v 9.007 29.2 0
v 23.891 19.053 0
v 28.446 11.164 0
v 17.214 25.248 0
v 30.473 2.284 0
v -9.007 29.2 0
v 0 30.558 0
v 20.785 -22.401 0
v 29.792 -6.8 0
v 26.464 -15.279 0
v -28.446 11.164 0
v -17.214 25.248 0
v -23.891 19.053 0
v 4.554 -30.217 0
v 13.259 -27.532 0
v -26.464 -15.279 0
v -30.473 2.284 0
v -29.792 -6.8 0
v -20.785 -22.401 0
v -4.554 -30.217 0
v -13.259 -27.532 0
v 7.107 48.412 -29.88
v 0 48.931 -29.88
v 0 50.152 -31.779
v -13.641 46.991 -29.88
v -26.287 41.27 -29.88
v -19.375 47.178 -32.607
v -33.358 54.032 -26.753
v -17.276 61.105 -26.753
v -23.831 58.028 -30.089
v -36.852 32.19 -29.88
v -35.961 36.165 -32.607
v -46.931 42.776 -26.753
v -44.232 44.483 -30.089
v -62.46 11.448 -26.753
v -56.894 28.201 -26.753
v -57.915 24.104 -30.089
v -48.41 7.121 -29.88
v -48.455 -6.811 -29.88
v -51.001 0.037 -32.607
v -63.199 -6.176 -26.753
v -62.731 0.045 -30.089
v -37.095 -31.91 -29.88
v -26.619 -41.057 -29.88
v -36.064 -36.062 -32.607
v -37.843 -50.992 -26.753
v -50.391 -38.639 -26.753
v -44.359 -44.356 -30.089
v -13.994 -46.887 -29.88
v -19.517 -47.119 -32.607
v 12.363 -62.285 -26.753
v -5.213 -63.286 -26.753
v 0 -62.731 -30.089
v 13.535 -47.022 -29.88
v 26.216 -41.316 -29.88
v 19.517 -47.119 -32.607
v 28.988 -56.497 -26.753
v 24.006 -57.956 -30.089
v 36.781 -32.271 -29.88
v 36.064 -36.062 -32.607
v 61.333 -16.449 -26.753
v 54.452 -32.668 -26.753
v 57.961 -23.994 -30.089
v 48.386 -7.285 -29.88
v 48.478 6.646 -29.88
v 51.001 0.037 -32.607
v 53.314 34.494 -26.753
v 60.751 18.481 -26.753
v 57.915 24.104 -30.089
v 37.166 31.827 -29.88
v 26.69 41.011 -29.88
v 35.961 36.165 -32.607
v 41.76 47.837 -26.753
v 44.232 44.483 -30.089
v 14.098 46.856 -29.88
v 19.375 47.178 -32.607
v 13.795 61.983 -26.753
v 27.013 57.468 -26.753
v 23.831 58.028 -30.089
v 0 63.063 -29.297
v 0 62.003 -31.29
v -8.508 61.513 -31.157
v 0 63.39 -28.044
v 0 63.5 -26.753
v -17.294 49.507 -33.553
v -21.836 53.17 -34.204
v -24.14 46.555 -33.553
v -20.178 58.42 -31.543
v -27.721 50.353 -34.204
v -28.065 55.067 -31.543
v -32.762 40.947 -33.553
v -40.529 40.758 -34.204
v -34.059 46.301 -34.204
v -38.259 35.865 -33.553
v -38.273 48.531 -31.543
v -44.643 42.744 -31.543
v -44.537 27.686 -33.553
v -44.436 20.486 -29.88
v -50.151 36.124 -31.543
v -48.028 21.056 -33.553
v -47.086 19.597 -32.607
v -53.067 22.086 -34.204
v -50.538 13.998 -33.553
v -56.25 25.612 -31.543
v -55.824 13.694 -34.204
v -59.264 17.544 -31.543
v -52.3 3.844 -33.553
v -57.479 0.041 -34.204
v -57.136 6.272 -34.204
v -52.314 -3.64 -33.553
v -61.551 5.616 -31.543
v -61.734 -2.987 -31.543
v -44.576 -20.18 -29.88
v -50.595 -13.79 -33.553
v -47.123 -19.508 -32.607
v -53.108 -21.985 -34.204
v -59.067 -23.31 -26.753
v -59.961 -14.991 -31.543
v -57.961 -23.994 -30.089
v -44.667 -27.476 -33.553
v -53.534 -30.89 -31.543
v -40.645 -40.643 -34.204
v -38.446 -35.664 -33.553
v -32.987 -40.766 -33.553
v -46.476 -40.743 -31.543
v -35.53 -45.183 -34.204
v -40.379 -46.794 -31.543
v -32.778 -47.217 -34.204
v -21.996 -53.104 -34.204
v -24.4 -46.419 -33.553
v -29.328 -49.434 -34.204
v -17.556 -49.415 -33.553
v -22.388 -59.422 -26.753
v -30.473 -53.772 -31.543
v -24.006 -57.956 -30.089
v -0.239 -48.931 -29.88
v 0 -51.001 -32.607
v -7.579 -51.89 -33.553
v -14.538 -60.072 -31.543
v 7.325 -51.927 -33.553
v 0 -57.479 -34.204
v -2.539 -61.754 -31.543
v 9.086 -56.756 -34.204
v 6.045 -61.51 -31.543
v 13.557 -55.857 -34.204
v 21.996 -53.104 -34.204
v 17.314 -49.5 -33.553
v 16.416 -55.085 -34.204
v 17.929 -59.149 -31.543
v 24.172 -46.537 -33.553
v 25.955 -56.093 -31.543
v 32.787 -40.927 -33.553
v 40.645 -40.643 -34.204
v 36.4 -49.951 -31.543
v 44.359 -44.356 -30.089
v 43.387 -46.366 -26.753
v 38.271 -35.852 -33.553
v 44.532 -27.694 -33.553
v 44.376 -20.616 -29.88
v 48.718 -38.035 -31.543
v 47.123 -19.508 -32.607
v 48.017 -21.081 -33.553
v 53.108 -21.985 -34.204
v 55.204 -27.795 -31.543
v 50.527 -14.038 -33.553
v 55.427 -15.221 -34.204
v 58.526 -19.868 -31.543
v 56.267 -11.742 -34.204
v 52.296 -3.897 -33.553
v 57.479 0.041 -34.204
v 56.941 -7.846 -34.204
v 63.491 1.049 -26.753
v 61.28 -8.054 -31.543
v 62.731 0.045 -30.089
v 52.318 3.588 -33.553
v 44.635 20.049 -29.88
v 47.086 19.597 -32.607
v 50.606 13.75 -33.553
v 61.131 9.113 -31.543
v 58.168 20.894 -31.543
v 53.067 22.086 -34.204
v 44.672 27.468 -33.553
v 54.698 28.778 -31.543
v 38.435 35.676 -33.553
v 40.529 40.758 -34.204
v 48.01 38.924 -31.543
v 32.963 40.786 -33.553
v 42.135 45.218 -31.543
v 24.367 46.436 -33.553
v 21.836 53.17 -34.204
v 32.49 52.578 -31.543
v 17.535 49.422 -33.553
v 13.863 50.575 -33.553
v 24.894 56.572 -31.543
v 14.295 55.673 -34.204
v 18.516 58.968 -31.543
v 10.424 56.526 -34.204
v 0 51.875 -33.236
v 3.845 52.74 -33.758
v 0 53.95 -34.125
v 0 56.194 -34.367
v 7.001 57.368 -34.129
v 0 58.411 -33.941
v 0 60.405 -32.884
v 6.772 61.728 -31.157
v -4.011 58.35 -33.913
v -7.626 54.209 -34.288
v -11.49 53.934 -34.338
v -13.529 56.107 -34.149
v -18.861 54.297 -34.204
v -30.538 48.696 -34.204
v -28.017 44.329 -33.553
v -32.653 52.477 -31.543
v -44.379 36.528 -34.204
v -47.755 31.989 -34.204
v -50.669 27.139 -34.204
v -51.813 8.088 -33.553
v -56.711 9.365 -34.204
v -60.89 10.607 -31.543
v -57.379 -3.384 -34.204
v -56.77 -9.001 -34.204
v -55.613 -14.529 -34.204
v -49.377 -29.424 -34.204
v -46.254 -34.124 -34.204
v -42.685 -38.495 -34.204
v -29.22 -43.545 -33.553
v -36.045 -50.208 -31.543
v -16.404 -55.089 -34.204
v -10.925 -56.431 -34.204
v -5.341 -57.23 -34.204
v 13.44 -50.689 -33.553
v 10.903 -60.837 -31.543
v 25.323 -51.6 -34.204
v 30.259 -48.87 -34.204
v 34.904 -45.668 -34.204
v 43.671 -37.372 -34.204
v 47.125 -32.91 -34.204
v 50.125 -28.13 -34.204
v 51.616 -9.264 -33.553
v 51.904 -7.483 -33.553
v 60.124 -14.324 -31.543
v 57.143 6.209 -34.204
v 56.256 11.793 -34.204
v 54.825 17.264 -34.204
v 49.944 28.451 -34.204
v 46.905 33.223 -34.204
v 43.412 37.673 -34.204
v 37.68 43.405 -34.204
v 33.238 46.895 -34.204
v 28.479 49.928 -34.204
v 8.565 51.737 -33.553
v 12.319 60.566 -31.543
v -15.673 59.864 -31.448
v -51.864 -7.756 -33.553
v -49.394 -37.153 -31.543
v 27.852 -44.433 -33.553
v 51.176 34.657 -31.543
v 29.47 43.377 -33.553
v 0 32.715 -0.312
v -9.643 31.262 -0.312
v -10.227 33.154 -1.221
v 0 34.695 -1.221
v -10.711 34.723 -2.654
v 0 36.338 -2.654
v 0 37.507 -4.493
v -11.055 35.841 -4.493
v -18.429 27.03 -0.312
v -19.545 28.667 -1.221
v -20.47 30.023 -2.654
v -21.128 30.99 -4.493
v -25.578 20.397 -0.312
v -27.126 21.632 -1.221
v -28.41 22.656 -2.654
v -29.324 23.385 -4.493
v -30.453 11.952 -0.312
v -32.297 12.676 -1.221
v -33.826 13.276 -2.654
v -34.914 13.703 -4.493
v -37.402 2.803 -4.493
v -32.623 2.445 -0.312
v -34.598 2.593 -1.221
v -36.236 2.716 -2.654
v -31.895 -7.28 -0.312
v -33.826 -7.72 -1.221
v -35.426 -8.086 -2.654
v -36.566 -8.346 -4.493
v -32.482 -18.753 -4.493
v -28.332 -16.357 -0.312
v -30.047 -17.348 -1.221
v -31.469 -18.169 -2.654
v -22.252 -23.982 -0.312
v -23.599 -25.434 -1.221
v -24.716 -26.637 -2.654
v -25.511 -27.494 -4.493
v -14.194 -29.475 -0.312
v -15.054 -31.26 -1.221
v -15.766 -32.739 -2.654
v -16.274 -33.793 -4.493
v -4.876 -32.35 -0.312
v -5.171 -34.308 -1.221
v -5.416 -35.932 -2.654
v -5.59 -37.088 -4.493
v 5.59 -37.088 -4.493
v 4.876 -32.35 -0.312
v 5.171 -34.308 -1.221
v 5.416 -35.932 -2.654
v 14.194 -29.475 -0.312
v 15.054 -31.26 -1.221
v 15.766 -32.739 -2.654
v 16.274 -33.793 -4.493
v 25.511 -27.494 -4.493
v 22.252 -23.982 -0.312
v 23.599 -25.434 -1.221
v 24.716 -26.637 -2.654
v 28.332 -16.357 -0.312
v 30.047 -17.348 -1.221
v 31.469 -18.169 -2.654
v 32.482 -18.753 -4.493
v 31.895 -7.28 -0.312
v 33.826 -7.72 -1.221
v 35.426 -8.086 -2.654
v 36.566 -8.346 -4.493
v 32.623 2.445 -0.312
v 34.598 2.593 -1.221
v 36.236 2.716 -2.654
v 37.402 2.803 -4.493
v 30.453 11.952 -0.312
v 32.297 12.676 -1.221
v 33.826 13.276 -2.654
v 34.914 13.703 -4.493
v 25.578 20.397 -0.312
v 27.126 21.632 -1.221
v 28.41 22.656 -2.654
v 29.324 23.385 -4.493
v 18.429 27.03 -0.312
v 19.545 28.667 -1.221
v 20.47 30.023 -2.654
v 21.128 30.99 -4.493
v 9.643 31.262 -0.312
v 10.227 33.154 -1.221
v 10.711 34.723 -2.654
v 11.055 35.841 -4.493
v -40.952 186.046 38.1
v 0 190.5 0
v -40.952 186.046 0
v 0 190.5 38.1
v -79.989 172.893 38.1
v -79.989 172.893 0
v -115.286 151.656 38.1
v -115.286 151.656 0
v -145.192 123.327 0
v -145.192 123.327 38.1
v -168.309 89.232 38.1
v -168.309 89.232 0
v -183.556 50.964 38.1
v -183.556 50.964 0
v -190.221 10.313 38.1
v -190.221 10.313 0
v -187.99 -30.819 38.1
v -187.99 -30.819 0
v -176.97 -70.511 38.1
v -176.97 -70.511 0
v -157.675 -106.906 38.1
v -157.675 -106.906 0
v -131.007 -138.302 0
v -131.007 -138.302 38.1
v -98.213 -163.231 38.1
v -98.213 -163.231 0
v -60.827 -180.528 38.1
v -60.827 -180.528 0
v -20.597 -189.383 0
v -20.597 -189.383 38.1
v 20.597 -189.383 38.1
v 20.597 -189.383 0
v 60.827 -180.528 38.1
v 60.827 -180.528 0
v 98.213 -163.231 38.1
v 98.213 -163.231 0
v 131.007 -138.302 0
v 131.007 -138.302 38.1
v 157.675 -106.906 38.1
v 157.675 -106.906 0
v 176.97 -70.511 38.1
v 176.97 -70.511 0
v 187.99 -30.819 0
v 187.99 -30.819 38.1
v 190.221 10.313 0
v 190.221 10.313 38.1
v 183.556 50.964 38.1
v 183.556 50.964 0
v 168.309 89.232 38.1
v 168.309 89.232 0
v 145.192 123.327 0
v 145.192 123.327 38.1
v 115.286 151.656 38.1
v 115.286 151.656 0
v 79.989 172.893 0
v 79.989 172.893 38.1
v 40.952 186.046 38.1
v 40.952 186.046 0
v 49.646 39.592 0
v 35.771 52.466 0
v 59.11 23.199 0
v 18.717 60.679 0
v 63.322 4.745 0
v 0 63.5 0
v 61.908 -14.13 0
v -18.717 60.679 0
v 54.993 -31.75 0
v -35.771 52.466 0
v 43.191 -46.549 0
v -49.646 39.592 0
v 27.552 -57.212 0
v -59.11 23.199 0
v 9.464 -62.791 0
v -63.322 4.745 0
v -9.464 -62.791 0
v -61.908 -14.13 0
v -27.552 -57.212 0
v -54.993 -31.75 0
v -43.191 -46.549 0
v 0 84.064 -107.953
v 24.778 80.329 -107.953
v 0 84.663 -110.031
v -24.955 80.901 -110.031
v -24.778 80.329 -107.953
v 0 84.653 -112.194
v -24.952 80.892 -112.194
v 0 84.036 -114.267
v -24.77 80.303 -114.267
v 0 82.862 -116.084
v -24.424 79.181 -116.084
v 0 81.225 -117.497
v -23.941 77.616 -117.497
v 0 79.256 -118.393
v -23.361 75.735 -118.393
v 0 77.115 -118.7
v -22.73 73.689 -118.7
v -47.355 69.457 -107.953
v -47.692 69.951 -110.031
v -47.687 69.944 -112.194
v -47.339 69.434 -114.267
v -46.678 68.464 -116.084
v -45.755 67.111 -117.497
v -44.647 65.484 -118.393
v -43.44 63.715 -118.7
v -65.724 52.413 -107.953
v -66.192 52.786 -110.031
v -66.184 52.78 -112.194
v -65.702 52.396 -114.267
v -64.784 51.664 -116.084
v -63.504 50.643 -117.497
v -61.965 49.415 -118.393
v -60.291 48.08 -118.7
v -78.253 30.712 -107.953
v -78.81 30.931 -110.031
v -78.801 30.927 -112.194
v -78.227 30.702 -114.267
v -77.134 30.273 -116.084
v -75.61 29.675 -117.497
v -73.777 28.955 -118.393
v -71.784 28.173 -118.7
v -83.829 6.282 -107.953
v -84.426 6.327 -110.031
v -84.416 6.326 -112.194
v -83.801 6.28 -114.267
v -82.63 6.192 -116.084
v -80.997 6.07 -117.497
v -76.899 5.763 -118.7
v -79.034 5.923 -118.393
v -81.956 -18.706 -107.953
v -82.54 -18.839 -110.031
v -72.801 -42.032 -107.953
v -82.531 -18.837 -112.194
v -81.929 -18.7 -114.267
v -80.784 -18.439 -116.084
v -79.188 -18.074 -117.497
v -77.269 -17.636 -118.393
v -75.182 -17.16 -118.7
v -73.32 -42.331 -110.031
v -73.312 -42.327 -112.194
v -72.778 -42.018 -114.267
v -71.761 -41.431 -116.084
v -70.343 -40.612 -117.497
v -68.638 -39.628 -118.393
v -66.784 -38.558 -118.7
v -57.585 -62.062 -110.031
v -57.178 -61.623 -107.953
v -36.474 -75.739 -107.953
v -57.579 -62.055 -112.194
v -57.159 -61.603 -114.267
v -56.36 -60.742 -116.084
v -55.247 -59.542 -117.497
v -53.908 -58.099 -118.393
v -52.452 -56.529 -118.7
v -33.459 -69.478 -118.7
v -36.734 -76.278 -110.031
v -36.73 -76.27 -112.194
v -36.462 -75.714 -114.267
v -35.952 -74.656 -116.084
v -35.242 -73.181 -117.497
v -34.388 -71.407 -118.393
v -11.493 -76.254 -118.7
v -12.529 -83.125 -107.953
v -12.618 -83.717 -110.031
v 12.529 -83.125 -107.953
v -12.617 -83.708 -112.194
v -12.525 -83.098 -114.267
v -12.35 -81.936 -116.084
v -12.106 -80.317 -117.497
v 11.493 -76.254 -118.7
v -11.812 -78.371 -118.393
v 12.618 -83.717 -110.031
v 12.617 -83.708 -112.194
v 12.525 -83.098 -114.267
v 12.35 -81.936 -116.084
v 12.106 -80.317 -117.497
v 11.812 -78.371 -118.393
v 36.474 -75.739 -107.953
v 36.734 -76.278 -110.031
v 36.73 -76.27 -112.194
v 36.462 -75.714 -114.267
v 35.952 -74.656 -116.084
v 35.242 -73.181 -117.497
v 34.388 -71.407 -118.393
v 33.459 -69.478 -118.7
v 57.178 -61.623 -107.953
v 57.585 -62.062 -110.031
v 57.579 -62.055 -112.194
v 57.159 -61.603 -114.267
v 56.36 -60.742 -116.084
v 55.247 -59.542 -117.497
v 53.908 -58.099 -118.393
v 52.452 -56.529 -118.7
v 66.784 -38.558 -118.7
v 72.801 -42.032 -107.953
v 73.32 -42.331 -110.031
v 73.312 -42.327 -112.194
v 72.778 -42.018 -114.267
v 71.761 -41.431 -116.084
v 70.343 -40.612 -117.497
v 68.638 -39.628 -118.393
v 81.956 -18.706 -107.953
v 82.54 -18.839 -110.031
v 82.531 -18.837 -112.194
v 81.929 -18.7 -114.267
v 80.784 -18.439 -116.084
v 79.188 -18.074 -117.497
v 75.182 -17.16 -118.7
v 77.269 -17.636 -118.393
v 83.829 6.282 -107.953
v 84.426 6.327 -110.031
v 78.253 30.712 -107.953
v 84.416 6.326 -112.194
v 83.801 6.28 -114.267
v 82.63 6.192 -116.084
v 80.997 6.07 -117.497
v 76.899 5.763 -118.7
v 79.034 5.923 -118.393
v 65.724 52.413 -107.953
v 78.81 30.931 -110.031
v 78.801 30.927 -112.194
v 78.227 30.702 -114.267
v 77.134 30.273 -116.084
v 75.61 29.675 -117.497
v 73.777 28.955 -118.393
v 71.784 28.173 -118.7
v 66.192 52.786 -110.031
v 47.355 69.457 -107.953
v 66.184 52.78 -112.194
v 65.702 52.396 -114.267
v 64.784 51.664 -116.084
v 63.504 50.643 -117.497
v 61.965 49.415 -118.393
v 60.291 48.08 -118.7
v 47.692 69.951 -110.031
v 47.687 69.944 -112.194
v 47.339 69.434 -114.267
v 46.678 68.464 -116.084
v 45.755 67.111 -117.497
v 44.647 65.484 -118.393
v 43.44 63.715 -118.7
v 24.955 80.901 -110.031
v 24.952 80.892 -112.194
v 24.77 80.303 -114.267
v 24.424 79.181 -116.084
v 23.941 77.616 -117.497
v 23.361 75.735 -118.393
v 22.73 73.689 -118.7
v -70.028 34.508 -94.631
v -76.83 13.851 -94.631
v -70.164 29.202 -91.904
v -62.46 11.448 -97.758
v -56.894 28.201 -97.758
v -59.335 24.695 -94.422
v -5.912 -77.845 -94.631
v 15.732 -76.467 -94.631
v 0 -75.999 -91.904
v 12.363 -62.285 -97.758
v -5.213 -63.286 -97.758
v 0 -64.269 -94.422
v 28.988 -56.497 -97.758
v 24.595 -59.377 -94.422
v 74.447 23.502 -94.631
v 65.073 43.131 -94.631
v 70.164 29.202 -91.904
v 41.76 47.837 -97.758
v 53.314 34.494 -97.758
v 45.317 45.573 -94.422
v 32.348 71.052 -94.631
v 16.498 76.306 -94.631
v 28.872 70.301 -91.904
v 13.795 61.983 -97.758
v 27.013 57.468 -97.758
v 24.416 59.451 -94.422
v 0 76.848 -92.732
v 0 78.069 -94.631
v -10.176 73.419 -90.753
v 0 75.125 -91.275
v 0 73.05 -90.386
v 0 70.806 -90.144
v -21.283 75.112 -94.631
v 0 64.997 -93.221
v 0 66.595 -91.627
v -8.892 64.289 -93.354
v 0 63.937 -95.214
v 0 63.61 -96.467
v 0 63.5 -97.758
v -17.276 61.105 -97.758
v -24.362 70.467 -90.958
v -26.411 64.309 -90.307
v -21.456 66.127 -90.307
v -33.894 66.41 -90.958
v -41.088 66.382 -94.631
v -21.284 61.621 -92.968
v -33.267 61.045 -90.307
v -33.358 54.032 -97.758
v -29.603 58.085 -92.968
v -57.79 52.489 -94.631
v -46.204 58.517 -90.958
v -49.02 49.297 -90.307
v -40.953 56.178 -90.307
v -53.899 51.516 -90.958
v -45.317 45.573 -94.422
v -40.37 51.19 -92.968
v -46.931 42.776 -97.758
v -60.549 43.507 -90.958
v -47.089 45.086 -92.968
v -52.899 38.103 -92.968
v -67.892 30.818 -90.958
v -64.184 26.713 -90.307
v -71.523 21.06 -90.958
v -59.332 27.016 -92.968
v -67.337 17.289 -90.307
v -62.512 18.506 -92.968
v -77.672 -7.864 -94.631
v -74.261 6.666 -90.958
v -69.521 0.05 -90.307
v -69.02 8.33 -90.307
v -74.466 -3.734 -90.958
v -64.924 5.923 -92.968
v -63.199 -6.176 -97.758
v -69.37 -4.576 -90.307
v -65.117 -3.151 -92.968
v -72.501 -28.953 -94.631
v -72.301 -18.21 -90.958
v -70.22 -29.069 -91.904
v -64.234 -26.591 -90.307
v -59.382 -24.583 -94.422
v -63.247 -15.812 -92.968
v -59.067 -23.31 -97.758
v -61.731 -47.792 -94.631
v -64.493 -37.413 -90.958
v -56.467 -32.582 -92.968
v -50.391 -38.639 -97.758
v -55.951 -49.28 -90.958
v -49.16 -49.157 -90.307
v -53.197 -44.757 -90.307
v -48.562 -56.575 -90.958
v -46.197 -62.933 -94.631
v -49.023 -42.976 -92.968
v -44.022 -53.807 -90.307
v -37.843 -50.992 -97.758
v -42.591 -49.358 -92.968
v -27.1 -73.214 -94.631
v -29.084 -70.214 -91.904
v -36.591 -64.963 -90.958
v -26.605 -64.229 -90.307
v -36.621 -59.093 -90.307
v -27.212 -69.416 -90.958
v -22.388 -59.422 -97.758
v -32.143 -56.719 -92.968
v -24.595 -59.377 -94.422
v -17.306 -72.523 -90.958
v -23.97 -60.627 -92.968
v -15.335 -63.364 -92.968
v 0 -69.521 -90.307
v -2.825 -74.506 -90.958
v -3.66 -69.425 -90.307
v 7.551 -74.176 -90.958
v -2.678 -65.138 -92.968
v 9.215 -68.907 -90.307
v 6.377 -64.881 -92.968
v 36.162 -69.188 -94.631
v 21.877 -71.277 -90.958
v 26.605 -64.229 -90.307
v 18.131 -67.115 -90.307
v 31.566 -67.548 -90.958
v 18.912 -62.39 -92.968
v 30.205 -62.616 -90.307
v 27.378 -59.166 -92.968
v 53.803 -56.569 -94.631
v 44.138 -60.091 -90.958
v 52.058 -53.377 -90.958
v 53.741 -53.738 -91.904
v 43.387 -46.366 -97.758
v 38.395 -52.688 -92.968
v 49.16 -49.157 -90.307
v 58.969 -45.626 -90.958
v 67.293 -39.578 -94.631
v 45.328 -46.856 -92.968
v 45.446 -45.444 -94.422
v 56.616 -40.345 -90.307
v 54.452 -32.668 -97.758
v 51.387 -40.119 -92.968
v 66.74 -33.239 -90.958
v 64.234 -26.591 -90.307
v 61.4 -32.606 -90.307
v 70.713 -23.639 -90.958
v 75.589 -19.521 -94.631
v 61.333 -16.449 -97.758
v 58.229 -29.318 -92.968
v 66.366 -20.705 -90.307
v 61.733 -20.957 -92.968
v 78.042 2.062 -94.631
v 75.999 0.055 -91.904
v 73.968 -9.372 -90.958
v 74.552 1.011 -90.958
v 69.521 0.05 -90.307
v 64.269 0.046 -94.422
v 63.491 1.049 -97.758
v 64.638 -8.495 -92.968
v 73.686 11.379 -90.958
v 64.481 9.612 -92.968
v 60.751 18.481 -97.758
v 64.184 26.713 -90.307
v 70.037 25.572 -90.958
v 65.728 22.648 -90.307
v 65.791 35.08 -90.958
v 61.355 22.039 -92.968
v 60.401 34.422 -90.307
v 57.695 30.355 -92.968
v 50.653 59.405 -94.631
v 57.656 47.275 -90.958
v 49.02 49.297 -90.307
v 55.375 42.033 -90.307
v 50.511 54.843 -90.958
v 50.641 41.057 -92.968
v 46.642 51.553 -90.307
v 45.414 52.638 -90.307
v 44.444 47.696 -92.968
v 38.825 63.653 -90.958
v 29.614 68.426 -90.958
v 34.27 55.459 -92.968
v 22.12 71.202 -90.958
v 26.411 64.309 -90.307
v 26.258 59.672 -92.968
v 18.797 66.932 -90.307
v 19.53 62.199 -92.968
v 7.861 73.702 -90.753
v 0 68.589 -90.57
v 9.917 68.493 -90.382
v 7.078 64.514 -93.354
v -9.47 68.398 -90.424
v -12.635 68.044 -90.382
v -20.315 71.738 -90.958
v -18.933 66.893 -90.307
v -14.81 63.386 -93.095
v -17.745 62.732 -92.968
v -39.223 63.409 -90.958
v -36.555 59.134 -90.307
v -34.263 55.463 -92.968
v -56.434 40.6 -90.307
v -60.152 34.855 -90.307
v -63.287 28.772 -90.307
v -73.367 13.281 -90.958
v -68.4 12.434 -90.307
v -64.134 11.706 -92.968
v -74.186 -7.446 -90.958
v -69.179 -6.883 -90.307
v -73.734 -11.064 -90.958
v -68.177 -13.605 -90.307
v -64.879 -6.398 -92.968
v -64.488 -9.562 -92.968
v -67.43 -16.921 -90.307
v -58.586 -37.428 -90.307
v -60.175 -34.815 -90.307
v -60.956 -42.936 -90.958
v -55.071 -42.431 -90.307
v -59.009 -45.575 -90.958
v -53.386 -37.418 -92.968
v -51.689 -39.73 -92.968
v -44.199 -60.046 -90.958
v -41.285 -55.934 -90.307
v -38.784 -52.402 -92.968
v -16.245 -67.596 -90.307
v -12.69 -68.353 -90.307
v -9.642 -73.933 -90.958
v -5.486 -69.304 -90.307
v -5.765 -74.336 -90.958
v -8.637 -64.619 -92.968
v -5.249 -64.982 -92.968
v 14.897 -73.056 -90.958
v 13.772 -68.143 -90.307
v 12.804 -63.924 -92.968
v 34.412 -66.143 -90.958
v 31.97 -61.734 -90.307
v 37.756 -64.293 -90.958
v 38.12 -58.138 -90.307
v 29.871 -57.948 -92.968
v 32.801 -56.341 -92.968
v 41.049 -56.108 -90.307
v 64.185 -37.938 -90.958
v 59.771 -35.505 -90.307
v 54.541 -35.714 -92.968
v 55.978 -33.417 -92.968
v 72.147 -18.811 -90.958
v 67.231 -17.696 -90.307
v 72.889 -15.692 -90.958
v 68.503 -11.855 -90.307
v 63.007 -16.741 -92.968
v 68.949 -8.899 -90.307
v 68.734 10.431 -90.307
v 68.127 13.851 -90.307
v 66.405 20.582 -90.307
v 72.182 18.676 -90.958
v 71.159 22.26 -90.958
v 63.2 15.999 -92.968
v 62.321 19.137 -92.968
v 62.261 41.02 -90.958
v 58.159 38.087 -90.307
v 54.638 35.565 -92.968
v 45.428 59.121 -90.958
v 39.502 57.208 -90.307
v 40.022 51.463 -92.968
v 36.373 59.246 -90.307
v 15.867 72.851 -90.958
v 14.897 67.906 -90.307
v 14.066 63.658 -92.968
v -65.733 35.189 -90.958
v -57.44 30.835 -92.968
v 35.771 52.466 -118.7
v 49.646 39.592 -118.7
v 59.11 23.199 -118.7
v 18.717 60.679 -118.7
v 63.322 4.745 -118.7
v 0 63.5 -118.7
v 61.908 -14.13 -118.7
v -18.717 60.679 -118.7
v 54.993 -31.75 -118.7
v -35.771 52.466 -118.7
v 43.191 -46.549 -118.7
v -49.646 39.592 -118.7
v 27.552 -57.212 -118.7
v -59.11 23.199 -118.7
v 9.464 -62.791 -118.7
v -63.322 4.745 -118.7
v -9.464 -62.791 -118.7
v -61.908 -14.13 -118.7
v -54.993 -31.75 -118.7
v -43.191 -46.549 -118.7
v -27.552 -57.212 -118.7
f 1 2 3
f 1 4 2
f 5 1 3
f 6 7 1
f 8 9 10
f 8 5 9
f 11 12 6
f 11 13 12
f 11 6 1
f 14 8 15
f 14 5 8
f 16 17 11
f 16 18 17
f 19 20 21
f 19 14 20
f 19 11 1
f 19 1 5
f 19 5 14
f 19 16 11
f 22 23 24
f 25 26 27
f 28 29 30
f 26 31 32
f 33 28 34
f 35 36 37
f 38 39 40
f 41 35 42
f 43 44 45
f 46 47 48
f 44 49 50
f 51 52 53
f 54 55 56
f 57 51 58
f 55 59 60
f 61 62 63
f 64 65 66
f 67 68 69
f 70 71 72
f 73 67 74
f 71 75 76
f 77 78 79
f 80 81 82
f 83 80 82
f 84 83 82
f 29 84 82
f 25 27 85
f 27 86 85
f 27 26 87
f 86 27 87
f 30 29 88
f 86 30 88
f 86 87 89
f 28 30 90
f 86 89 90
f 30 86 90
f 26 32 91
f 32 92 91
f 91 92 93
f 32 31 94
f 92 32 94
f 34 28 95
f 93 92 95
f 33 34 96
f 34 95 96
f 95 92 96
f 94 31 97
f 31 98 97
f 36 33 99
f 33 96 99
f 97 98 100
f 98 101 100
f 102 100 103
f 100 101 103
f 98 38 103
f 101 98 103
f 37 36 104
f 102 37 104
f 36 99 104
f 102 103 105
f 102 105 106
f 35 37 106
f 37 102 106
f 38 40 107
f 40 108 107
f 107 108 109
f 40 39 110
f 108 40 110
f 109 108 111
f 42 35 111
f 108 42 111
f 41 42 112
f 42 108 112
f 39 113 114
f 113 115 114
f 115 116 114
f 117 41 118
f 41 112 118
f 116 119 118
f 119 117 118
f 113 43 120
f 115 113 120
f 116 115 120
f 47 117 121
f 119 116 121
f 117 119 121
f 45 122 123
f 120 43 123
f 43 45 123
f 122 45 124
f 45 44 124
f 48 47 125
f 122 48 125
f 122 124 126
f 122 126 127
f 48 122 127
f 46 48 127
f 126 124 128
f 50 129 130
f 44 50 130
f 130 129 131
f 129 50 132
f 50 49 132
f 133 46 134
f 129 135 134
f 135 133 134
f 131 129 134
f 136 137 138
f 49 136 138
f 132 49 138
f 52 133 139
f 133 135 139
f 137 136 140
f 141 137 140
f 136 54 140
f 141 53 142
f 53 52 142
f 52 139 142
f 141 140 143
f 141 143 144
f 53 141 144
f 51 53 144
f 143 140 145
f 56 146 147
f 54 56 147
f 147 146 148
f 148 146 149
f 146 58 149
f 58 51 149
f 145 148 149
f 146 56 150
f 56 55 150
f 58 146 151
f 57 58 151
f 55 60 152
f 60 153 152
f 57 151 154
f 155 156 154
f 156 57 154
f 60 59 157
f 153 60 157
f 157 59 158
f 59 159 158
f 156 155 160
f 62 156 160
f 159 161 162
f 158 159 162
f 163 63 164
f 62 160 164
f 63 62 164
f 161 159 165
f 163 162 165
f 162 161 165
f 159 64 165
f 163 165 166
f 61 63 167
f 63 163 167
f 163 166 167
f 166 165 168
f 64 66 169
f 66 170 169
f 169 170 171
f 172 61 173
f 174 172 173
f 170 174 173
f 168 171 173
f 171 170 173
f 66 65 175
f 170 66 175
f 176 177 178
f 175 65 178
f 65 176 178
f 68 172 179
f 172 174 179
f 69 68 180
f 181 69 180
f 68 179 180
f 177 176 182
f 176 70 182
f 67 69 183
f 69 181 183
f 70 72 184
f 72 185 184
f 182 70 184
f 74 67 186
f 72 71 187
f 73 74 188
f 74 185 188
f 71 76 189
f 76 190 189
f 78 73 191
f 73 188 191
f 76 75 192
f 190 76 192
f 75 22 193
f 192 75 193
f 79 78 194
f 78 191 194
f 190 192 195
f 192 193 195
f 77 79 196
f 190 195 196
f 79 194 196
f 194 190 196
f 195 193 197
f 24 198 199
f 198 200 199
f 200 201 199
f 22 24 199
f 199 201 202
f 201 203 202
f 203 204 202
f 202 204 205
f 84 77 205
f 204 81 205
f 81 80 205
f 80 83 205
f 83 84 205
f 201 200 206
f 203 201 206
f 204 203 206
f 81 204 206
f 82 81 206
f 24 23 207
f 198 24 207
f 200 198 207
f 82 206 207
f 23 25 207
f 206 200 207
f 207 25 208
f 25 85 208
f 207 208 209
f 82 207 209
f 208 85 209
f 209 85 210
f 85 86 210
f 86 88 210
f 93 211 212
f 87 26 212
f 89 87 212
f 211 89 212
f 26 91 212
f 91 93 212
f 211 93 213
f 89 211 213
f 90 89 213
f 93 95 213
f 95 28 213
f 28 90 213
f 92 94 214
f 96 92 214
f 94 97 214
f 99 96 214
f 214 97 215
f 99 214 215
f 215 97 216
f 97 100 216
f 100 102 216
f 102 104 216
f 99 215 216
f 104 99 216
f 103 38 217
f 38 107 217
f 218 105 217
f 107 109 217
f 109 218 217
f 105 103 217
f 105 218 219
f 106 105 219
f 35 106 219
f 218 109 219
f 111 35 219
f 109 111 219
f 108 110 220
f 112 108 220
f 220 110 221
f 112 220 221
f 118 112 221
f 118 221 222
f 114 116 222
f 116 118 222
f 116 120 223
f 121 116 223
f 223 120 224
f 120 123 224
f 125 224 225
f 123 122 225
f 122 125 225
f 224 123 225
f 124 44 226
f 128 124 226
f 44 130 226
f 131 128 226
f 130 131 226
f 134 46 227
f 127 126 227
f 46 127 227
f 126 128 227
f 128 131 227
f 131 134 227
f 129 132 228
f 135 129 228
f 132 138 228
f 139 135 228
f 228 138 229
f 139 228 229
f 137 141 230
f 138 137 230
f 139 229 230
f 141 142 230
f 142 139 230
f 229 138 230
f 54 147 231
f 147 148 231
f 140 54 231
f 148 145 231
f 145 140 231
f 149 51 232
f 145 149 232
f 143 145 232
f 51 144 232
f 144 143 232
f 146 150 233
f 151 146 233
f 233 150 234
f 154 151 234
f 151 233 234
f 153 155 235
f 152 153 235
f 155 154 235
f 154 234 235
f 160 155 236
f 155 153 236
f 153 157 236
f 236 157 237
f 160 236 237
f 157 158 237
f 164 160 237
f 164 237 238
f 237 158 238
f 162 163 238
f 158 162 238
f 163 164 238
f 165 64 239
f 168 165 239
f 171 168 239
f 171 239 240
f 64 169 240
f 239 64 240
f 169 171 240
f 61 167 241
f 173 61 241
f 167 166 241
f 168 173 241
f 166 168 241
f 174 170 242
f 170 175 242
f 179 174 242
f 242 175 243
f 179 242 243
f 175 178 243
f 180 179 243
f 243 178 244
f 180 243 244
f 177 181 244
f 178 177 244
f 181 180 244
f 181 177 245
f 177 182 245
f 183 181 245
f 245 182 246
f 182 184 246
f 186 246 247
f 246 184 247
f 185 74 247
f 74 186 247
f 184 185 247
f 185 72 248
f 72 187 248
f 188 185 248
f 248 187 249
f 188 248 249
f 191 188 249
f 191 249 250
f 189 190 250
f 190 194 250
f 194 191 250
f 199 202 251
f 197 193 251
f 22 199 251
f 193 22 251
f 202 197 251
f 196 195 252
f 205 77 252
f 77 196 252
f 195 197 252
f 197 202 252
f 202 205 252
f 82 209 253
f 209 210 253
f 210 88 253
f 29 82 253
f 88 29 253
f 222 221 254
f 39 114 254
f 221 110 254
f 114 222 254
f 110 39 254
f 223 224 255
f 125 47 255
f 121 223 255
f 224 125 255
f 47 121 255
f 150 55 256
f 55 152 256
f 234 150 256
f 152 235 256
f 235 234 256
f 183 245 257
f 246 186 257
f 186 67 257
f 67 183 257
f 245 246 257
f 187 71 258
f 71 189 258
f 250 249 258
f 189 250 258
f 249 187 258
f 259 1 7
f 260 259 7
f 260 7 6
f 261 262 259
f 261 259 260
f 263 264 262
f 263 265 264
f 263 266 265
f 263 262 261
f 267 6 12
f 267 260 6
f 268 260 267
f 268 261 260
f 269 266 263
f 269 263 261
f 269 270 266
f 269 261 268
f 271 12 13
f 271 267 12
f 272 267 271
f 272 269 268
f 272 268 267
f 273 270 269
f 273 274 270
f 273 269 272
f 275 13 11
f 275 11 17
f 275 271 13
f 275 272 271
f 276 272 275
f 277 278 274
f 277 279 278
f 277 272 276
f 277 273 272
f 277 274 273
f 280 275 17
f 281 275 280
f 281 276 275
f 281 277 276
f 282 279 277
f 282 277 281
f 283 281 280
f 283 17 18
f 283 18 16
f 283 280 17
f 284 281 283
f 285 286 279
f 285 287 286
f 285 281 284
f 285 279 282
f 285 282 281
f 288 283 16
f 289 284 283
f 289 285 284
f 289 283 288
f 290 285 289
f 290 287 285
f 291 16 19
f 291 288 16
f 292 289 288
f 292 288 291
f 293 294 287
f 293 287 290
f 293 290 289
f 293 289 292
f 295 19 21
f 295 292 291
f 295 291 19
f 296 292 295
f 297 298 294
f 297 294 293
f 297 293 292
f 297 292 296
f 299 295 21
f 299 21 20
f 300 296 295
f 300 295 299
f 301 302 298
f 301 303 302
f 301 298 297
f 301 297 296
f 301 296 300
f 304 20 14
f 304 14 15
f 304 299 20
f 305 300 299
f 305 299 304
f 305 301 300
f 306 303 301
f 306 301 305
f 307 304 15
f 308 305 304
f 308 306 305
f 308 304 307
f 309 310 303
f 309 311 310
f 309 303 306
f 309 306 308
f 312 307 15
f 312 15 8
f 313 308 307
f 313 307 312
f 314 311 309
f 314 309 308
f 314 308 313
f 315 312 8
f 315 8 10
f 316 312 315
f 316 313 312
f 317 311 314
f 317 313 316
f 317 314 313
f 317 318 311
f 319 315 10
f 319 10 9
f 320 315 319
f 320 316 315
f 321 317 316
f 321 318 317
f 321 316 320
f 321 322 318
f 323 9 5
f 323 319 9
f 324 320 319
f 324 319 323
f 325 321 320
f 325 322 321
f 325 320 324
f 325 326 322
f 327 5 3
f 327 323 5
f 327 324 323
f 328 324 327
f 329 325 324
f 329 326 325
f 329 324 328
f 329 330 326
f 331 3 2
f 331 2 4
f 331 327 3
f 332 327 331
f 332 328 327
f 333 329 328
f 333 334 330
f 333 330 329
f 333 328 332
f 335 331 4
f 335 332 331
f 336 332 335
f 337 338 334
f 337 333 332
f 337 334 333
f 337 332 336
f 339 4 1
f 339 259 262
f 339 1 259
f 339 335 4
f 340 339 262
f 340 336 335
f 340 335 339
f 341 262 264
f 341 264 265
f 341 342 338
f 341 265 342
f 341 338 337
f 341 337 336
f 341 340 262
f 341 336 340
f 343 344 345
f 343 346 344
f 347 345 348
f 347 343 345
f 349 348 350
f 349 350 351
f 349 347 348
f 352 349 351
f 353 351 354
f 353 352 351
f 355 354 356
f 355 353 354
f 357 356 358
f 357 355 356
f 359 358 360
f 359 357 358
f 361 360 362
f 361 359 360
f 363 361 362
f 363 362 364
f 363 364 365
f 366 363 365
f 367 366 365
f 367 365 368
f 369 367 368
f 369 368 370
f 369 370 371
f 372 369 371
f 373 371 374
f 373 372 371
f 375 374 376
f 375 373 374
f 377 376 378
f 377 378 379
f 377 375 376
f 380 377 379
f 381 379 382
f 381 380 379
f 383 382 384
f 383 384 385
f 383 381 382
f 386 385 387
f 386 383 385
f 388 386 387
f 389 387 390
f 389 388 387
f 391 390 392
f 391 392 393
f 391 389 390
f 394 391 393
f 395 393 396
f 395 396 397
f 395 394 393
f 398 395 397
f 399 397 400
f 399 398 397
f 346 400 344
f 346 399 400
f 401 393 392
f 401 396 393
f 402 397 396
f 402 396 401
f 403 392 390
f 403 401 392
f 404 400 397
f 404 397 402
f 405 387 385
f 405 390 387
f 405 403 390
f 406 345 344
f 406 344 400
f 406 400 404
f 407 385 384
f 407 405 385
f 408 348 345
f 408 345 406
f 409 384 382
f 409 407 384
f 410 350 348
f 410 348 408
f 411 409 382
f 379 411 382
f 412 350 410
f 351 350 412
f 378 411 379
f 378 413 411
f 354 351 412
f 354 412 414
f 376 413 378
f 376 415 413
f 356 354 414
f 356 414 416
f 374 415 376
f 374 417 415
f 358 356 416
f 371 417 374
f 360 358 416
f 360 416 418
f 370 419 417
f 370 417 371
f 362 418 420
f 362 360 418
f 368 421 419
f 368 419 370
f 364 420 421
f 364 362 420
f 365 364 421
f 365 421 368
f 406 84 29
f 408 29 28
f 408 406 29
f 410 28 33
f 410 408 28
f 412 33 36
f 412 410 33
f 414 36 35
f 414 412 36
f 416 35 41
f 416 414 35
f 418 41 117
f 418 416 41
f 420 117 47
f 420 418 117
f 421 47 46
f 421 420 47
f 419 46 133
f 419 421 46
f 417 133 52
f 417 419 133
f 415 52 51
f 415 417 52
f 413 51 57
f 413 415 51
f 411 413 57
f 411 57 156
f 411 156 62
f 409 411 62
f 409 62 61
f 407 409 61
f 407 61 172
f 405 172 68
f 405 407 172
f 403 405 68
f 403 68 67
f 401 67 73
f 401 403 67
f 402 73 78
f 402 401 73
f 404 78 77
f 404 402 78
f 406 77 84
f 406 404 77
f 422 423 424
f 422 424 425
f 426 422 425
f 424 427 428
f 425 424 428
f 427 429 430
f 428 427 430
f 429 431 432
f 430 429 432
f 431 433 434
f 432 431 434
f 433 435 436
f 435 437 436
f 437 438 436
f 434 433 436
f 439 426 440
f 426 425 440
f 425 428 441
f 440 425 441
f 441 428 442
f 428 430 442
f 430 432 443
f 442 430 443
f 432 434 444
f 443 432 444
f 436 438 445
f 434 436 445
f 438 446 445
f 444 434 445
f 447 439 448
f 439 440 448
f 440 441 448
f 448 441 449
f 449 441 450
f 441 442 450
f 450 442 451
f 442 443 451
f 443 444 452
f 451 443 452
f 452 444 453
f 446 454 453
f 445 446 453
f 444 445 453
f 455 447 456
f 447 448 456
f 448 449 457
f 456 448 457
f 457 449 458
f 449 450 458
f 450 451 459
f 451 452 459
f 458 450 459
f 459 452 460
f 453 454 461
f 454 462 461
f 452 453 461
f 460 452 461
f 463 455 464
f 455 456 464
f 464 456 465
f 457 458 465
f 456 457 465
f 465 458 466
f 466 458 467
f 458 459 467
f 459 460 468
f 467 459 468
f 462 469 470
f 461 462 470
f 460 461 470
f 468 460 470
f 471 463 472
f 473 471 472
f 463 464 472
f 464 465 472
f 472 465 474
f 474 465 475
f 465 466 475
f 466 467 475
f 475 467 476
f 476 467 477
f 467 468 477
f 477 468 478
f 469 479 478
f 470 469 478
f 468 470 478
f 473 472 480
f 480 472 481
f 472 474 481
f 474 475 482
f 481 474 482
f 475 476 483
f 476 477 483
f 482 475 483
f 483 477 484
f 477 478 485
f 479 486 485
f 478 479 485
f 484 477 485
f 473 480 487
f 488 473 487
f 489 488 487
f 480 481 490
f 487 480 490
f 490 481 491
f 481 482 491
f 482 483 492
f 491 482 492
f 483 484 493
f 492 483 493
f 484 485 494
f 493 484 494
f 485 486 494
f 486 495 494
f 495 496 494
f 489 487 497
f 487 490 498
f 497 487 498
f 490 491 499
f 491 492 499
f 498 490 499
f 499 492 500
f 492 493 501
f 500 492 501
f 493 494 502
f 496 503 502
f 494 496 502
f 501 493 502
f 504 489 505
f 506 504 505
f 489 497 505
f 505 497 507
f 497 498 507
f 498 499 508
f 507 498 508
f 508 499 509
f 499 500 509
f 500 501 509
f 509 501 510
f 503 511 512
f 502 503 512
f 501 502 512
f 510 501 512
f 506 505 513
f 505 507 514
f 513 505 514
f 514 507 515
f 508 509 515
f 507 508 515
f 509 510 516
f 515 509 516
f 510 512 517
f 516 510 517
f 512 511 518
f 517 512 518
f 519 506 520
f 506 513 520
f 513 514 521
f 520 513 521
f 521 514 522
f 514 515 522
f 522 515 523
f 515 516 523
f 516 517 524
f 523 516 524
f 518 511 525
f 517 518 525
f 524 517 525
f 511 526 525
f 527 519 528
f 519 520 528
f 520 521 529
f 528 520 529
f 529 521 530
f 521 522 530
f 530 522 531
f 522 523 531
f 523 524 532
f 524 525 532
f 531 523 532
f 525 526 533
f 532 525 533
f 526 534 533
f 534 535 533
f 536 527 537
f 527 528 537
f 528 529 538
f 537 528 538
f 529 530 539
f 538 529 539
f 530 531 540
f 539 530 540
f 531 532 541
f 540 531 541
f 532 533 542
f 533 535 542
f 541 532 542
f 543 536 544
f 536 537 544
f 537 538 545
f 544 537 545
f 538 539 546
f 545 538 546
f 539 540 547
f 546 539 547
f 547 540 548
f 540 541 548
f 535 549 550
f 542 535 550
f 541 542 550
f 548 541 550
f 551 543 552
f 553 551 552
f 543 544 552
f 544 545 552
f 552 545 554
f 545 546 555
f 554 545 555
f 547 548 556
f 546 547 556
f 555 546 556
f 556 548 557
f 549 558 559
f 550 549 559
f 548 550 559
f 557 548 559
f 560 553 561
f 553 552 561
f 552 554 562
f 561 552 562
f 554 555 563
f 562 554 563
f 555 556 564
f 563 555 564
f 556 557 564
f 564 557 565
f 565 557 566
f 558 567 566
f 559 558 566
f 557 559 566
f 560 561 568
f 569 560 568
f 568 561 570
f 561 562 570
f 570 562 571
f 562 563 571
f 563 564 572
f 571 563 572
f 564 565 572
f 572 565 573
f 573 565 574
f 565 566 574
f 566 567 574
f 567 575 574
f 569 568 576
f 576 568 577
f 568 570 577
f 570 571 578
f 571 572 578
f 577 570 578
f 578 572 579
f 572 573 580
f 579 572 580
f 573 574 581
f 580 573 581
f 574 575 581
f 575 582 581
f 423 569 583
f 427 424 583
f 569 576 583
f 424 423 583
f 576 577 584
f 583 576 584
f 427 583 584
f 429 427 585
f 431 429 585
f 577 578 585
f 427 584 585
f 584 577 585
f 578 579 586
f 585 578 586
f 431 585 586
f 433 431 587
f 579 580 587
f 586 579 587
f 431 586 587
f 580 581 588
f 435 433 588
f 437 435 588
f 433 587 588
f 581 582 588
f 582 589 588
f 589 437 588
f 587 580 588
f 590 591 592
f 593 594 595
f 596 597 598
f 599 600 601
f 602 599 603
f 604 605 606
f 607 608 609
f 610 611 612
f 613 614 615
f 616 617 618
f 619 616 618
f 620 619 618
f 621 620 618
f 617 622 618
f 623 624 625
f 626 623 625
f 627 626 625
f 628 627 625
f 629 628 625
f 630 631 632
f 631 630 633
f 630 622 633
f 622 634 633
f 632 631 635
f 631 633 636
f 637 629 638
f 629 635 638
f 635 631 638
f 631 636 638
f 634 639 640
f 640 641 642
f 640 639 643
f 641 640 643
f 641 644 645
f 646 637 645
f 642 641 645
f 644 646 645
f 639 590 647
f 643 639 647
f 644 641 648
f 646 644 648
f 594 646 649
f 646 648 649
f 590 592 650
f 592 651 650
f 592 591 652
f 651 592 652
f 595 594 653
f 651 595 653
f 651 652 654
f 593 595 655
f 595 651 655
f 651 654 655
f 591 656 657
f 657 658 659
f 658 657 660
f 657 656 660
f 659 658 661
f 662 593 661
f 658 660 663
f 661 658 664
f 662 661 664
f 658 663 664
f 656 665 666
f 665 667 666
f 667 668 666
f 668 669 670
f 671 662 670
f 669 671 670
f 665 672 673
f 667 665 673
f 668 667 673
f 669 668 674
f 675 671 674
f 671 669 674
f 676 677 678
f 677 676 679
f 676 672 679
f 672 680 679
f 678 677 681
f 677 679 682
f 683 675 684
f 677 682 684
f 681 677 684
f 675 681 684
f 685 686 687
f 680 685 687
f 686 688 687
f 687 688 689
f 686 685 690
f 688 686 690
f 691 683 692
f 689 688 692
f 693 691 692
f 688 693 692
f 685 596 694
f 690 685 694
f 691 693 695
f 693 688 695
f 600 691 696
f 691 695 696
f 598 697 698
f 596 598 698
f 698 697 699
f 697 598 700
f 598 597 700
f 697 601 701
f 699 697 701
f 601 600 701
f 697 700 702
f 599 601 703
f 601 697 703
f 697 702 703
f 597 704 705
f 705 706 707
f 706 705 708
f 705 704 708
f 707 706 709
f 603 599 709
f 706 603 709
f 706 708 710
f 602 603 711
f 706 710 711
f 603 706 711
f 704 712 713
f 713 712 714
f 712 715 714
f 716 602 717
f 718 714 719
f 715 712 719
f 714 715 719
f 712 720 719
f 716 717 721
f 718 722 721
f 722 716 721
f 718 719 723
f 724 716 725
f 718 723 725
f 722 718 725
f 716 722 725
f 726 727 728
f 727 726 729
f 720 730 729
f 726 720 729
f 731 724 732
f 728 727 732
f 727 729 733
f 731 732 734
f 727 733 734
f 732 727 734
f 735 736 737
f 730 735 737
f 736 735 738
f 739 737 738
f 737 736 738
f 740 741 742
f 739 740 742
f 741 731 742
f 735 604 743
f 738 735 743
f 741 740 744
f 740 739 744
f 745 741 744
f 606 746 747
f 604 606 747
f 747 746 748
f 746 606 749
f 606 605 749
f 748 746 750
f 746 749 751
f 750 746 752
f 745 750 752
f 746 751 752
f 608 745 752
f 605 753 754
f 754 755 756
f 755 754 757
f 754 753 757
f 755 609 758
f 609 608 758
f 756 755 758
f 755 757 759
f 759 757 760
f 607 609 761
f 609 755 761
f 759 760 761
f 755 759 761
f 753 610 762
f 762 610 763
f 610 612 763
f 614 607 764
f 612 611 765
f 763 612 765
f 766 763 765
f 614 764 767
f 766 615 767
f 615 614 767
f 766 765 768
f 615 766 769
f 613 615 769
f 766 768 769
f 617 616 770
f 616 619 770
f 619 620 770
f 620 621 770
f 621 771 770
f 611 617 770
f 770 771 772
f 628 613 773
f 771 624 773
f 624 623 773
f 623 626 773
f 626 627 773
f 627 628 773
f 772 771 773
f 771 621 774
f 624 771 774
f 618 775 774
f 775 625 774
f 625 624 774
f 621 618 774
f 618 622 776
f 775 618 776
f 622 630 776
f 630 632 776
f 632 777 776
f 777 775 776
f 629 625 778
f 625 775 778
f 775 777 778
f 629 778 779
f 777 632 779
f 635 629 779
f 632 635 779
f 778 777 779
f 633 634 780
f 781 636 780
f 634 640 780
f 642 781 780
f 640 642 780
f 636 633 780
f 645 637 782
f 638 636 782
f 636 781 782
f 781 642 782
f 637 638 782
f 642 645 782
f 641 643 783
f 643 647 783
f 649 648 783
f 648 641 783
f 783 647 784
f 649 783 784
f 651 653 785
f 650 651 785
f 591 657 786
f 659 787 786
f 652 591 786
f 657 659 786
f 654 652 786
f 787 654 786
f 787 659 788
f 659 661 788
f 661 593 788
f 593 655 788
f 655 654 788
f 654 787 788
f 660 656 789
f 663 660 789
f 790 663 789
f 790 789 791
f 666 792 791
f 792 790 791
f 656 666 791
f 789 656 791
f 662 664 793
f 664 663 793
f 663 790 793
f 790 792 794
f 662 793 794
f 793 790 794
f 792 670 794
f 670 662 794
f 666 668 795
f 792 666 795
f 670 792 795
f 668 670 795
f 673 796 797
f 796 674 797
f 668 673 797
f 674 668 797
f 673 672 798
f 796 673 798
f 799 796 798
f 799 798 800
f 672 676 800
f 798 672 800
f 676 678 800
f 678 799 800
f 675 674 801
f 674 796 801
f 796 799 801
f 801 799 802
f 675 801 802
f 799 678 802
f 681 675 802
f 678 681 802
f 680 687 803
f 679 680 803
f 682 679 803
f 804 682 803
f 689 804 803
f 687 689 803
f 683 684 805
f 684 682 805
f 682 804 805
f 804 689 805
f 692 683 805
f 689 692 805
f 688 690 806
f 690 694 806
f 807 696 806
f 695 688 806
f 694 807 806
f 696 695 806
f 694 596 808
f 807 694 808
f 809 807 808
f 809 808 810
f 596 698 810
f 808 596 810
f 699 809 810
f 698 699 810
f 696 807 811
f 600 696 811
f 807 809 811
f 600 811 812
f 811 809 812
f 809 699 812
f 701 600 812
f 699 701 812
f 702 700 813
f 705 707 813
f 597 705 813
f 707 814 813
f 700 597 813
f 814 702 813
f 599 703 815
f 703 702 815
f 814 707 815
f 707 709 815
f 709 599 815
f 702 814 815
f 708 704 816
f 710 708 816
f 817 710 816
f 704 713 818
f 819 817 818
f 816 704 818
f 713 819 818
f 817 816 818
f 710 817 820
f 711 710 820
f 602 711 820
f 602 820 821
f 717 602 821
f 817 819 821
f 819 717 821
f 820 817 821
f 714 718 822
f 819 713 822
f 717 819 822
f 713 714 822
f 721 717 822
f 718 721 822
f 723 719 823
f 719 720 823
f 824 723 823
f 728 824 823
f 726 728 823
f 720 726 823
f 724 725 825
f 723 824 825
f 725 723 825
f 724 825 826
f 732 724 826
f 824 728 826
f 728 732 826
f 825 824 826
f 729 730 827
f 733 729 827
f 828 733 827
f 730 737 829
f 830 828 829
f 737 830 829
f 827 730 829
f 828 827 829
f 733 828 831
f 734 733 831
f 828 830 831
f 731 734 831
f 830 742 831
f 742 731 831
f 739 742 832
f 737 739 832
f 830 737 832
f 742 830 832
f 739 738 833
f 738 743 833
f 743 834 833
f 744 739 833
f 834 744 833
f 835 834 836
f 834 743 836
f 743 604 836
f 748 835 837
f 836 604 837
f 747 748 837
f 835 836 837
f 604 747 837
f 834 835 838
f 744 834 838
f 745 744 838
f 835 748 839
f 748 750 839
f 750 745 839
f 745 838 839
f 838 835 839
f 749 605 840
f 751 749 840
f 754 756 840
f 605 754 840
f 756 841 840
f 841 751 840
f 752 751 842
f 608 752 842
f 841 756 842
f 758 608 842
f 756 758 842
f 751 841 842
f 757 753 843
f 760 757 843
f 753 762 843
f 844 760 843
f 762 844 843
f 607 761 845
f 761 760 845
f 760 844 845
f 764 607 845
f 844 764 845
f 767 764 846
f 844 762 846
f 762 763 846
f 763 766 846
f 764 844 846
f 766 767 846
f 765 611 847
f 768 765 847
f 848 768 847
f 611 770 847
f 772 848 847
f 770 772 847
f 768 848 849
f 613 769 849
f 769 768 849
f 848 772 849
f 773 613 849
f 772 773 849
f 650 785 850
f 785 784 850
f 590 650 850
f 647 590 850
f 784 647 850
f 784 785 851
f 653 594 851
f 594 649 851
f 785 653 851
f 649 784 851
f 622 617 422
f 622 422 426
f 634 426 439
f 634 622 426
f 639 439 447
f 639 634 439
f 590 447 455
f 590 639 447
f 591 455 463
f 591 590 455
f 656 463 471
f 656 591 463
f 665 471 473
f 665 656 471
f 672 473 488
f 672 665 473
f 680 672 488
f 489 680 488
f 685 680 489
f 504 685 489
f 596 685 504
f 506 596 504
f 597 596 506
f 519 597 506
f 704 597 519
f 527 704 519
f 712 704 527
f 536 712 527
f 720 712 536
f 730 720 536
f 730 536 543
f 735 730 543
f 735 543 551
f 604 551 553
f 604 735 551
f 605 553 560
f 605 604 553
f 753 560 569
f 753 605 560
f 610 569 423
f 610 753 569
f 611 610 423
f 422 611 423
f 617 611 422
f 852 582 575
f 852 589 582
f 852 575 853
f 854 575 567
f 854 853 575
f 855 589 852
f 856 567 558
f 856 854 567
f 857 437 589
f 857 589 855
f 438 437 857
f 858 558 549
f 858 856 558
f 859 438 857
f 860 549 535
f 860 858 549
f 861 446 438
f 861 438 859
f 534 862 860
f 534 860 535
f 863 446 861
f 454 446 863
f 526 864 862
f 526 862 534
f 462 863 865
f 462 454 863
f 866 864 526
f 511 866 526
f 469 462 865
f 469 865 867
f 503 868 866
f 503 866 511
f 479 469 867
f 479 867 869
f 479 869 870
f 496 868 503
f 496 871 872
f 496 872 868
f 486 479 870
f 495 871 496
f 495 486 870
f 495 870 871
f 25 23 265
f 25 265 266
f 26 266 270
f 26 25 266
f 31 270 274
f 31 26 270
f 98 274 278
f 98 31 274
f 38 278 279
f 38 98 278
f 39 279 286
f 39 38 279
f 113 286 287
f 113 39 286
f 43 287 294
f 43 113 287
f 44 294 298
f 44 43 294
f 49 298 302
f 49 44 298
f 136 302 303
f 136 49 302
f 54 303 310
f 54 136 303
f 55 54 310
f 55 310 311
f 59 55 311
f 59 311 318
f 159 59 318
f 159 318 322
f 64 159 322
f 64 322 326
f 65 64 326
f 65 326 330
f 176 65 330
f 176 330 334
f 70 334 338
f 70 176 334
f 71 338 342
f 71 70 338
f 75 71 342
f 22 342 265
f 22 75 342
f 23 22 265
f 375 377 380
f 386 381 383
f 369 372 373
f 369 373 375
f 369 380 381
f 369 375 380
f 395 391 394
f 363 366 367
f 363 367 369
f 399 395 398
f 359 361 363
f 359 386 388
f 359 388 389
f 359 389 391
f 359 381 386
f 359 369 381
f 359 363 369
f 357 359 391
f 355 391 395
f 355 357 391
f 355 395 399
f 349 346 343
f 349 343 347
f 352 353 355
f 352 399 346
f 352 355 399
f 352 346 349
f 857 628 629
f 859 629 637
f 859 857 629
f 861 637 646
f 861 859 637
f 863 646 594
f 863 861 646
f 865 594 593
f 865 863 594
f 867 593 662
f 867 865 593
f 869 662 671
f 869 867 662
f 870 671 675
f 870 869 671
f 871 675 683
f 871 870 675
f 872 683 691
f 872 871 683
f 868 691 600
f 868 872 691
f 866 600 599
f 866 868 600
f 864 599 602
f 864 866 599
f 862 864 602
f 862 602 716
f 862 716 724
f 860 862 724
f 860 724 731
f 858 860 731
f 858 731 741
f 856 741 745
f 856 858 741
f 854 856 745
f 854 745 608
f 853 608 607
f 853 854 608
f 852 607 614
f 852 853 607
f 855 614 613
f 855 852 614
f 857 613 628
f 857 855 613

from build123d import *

# Parameters (mm, degrees)
F0_W   = 127
F0_H   = 38.1
F2_R   = 7.62
F2_2_R = 7.62


with BuildPart() as f1:
    # F0 (on Right) → F1 (revolve)
    with BuildSketch(Plane.YZ):
        Polygon((0, 8.3), (0, 0), (35.485, 0), (31.75, 8.3), align=None)
        Polygon((31.75, 8.3), (35.485, 0), (63.5, 0), (63.5, 38.1), (0, 38.1), (0, 8.3), align=None)
        Polygon((63.5, 0), (35.485, 0), (63.5, -62.2555555556), align=None)
        with Locations((127, 19.05)):
            Rectangle(F0_W, F0_H)
    revolve(axis=Axis((0, 0, 4.15), (0, 0, 1)))

    # F2#2
    f2_2_edges = [f1.edges().sort_by_distance(p)[0] for p in [
        (0, -35.485, 0),
        (0, -63.5, -62.255556),
    ]]
    fillet(f2_2_edges, radius=F2_2_R)


with BuildPart() as f1b:
    # F0 (on Right) → F1, piece 2 (revolve)
    with BuildSketch(Plane.YZ):
        Polygon((88.9, -118.7), (63.5, -62.2555555556), (63.5, -118.7), align=None)
    revolve(axis=Axis((0, 0, 4.15), (0, 0, 1)))

    # F2
    f2_edges = [f1b.edges().sort_by_distance(p)[0] for p in [
        (0, -88.9, -118.7),
        (0, -63.5, -62.255556),
    ]]
    fillet(f2_edges, radius=F2_R)


solid = Compound([f1.part, f1b.part])
